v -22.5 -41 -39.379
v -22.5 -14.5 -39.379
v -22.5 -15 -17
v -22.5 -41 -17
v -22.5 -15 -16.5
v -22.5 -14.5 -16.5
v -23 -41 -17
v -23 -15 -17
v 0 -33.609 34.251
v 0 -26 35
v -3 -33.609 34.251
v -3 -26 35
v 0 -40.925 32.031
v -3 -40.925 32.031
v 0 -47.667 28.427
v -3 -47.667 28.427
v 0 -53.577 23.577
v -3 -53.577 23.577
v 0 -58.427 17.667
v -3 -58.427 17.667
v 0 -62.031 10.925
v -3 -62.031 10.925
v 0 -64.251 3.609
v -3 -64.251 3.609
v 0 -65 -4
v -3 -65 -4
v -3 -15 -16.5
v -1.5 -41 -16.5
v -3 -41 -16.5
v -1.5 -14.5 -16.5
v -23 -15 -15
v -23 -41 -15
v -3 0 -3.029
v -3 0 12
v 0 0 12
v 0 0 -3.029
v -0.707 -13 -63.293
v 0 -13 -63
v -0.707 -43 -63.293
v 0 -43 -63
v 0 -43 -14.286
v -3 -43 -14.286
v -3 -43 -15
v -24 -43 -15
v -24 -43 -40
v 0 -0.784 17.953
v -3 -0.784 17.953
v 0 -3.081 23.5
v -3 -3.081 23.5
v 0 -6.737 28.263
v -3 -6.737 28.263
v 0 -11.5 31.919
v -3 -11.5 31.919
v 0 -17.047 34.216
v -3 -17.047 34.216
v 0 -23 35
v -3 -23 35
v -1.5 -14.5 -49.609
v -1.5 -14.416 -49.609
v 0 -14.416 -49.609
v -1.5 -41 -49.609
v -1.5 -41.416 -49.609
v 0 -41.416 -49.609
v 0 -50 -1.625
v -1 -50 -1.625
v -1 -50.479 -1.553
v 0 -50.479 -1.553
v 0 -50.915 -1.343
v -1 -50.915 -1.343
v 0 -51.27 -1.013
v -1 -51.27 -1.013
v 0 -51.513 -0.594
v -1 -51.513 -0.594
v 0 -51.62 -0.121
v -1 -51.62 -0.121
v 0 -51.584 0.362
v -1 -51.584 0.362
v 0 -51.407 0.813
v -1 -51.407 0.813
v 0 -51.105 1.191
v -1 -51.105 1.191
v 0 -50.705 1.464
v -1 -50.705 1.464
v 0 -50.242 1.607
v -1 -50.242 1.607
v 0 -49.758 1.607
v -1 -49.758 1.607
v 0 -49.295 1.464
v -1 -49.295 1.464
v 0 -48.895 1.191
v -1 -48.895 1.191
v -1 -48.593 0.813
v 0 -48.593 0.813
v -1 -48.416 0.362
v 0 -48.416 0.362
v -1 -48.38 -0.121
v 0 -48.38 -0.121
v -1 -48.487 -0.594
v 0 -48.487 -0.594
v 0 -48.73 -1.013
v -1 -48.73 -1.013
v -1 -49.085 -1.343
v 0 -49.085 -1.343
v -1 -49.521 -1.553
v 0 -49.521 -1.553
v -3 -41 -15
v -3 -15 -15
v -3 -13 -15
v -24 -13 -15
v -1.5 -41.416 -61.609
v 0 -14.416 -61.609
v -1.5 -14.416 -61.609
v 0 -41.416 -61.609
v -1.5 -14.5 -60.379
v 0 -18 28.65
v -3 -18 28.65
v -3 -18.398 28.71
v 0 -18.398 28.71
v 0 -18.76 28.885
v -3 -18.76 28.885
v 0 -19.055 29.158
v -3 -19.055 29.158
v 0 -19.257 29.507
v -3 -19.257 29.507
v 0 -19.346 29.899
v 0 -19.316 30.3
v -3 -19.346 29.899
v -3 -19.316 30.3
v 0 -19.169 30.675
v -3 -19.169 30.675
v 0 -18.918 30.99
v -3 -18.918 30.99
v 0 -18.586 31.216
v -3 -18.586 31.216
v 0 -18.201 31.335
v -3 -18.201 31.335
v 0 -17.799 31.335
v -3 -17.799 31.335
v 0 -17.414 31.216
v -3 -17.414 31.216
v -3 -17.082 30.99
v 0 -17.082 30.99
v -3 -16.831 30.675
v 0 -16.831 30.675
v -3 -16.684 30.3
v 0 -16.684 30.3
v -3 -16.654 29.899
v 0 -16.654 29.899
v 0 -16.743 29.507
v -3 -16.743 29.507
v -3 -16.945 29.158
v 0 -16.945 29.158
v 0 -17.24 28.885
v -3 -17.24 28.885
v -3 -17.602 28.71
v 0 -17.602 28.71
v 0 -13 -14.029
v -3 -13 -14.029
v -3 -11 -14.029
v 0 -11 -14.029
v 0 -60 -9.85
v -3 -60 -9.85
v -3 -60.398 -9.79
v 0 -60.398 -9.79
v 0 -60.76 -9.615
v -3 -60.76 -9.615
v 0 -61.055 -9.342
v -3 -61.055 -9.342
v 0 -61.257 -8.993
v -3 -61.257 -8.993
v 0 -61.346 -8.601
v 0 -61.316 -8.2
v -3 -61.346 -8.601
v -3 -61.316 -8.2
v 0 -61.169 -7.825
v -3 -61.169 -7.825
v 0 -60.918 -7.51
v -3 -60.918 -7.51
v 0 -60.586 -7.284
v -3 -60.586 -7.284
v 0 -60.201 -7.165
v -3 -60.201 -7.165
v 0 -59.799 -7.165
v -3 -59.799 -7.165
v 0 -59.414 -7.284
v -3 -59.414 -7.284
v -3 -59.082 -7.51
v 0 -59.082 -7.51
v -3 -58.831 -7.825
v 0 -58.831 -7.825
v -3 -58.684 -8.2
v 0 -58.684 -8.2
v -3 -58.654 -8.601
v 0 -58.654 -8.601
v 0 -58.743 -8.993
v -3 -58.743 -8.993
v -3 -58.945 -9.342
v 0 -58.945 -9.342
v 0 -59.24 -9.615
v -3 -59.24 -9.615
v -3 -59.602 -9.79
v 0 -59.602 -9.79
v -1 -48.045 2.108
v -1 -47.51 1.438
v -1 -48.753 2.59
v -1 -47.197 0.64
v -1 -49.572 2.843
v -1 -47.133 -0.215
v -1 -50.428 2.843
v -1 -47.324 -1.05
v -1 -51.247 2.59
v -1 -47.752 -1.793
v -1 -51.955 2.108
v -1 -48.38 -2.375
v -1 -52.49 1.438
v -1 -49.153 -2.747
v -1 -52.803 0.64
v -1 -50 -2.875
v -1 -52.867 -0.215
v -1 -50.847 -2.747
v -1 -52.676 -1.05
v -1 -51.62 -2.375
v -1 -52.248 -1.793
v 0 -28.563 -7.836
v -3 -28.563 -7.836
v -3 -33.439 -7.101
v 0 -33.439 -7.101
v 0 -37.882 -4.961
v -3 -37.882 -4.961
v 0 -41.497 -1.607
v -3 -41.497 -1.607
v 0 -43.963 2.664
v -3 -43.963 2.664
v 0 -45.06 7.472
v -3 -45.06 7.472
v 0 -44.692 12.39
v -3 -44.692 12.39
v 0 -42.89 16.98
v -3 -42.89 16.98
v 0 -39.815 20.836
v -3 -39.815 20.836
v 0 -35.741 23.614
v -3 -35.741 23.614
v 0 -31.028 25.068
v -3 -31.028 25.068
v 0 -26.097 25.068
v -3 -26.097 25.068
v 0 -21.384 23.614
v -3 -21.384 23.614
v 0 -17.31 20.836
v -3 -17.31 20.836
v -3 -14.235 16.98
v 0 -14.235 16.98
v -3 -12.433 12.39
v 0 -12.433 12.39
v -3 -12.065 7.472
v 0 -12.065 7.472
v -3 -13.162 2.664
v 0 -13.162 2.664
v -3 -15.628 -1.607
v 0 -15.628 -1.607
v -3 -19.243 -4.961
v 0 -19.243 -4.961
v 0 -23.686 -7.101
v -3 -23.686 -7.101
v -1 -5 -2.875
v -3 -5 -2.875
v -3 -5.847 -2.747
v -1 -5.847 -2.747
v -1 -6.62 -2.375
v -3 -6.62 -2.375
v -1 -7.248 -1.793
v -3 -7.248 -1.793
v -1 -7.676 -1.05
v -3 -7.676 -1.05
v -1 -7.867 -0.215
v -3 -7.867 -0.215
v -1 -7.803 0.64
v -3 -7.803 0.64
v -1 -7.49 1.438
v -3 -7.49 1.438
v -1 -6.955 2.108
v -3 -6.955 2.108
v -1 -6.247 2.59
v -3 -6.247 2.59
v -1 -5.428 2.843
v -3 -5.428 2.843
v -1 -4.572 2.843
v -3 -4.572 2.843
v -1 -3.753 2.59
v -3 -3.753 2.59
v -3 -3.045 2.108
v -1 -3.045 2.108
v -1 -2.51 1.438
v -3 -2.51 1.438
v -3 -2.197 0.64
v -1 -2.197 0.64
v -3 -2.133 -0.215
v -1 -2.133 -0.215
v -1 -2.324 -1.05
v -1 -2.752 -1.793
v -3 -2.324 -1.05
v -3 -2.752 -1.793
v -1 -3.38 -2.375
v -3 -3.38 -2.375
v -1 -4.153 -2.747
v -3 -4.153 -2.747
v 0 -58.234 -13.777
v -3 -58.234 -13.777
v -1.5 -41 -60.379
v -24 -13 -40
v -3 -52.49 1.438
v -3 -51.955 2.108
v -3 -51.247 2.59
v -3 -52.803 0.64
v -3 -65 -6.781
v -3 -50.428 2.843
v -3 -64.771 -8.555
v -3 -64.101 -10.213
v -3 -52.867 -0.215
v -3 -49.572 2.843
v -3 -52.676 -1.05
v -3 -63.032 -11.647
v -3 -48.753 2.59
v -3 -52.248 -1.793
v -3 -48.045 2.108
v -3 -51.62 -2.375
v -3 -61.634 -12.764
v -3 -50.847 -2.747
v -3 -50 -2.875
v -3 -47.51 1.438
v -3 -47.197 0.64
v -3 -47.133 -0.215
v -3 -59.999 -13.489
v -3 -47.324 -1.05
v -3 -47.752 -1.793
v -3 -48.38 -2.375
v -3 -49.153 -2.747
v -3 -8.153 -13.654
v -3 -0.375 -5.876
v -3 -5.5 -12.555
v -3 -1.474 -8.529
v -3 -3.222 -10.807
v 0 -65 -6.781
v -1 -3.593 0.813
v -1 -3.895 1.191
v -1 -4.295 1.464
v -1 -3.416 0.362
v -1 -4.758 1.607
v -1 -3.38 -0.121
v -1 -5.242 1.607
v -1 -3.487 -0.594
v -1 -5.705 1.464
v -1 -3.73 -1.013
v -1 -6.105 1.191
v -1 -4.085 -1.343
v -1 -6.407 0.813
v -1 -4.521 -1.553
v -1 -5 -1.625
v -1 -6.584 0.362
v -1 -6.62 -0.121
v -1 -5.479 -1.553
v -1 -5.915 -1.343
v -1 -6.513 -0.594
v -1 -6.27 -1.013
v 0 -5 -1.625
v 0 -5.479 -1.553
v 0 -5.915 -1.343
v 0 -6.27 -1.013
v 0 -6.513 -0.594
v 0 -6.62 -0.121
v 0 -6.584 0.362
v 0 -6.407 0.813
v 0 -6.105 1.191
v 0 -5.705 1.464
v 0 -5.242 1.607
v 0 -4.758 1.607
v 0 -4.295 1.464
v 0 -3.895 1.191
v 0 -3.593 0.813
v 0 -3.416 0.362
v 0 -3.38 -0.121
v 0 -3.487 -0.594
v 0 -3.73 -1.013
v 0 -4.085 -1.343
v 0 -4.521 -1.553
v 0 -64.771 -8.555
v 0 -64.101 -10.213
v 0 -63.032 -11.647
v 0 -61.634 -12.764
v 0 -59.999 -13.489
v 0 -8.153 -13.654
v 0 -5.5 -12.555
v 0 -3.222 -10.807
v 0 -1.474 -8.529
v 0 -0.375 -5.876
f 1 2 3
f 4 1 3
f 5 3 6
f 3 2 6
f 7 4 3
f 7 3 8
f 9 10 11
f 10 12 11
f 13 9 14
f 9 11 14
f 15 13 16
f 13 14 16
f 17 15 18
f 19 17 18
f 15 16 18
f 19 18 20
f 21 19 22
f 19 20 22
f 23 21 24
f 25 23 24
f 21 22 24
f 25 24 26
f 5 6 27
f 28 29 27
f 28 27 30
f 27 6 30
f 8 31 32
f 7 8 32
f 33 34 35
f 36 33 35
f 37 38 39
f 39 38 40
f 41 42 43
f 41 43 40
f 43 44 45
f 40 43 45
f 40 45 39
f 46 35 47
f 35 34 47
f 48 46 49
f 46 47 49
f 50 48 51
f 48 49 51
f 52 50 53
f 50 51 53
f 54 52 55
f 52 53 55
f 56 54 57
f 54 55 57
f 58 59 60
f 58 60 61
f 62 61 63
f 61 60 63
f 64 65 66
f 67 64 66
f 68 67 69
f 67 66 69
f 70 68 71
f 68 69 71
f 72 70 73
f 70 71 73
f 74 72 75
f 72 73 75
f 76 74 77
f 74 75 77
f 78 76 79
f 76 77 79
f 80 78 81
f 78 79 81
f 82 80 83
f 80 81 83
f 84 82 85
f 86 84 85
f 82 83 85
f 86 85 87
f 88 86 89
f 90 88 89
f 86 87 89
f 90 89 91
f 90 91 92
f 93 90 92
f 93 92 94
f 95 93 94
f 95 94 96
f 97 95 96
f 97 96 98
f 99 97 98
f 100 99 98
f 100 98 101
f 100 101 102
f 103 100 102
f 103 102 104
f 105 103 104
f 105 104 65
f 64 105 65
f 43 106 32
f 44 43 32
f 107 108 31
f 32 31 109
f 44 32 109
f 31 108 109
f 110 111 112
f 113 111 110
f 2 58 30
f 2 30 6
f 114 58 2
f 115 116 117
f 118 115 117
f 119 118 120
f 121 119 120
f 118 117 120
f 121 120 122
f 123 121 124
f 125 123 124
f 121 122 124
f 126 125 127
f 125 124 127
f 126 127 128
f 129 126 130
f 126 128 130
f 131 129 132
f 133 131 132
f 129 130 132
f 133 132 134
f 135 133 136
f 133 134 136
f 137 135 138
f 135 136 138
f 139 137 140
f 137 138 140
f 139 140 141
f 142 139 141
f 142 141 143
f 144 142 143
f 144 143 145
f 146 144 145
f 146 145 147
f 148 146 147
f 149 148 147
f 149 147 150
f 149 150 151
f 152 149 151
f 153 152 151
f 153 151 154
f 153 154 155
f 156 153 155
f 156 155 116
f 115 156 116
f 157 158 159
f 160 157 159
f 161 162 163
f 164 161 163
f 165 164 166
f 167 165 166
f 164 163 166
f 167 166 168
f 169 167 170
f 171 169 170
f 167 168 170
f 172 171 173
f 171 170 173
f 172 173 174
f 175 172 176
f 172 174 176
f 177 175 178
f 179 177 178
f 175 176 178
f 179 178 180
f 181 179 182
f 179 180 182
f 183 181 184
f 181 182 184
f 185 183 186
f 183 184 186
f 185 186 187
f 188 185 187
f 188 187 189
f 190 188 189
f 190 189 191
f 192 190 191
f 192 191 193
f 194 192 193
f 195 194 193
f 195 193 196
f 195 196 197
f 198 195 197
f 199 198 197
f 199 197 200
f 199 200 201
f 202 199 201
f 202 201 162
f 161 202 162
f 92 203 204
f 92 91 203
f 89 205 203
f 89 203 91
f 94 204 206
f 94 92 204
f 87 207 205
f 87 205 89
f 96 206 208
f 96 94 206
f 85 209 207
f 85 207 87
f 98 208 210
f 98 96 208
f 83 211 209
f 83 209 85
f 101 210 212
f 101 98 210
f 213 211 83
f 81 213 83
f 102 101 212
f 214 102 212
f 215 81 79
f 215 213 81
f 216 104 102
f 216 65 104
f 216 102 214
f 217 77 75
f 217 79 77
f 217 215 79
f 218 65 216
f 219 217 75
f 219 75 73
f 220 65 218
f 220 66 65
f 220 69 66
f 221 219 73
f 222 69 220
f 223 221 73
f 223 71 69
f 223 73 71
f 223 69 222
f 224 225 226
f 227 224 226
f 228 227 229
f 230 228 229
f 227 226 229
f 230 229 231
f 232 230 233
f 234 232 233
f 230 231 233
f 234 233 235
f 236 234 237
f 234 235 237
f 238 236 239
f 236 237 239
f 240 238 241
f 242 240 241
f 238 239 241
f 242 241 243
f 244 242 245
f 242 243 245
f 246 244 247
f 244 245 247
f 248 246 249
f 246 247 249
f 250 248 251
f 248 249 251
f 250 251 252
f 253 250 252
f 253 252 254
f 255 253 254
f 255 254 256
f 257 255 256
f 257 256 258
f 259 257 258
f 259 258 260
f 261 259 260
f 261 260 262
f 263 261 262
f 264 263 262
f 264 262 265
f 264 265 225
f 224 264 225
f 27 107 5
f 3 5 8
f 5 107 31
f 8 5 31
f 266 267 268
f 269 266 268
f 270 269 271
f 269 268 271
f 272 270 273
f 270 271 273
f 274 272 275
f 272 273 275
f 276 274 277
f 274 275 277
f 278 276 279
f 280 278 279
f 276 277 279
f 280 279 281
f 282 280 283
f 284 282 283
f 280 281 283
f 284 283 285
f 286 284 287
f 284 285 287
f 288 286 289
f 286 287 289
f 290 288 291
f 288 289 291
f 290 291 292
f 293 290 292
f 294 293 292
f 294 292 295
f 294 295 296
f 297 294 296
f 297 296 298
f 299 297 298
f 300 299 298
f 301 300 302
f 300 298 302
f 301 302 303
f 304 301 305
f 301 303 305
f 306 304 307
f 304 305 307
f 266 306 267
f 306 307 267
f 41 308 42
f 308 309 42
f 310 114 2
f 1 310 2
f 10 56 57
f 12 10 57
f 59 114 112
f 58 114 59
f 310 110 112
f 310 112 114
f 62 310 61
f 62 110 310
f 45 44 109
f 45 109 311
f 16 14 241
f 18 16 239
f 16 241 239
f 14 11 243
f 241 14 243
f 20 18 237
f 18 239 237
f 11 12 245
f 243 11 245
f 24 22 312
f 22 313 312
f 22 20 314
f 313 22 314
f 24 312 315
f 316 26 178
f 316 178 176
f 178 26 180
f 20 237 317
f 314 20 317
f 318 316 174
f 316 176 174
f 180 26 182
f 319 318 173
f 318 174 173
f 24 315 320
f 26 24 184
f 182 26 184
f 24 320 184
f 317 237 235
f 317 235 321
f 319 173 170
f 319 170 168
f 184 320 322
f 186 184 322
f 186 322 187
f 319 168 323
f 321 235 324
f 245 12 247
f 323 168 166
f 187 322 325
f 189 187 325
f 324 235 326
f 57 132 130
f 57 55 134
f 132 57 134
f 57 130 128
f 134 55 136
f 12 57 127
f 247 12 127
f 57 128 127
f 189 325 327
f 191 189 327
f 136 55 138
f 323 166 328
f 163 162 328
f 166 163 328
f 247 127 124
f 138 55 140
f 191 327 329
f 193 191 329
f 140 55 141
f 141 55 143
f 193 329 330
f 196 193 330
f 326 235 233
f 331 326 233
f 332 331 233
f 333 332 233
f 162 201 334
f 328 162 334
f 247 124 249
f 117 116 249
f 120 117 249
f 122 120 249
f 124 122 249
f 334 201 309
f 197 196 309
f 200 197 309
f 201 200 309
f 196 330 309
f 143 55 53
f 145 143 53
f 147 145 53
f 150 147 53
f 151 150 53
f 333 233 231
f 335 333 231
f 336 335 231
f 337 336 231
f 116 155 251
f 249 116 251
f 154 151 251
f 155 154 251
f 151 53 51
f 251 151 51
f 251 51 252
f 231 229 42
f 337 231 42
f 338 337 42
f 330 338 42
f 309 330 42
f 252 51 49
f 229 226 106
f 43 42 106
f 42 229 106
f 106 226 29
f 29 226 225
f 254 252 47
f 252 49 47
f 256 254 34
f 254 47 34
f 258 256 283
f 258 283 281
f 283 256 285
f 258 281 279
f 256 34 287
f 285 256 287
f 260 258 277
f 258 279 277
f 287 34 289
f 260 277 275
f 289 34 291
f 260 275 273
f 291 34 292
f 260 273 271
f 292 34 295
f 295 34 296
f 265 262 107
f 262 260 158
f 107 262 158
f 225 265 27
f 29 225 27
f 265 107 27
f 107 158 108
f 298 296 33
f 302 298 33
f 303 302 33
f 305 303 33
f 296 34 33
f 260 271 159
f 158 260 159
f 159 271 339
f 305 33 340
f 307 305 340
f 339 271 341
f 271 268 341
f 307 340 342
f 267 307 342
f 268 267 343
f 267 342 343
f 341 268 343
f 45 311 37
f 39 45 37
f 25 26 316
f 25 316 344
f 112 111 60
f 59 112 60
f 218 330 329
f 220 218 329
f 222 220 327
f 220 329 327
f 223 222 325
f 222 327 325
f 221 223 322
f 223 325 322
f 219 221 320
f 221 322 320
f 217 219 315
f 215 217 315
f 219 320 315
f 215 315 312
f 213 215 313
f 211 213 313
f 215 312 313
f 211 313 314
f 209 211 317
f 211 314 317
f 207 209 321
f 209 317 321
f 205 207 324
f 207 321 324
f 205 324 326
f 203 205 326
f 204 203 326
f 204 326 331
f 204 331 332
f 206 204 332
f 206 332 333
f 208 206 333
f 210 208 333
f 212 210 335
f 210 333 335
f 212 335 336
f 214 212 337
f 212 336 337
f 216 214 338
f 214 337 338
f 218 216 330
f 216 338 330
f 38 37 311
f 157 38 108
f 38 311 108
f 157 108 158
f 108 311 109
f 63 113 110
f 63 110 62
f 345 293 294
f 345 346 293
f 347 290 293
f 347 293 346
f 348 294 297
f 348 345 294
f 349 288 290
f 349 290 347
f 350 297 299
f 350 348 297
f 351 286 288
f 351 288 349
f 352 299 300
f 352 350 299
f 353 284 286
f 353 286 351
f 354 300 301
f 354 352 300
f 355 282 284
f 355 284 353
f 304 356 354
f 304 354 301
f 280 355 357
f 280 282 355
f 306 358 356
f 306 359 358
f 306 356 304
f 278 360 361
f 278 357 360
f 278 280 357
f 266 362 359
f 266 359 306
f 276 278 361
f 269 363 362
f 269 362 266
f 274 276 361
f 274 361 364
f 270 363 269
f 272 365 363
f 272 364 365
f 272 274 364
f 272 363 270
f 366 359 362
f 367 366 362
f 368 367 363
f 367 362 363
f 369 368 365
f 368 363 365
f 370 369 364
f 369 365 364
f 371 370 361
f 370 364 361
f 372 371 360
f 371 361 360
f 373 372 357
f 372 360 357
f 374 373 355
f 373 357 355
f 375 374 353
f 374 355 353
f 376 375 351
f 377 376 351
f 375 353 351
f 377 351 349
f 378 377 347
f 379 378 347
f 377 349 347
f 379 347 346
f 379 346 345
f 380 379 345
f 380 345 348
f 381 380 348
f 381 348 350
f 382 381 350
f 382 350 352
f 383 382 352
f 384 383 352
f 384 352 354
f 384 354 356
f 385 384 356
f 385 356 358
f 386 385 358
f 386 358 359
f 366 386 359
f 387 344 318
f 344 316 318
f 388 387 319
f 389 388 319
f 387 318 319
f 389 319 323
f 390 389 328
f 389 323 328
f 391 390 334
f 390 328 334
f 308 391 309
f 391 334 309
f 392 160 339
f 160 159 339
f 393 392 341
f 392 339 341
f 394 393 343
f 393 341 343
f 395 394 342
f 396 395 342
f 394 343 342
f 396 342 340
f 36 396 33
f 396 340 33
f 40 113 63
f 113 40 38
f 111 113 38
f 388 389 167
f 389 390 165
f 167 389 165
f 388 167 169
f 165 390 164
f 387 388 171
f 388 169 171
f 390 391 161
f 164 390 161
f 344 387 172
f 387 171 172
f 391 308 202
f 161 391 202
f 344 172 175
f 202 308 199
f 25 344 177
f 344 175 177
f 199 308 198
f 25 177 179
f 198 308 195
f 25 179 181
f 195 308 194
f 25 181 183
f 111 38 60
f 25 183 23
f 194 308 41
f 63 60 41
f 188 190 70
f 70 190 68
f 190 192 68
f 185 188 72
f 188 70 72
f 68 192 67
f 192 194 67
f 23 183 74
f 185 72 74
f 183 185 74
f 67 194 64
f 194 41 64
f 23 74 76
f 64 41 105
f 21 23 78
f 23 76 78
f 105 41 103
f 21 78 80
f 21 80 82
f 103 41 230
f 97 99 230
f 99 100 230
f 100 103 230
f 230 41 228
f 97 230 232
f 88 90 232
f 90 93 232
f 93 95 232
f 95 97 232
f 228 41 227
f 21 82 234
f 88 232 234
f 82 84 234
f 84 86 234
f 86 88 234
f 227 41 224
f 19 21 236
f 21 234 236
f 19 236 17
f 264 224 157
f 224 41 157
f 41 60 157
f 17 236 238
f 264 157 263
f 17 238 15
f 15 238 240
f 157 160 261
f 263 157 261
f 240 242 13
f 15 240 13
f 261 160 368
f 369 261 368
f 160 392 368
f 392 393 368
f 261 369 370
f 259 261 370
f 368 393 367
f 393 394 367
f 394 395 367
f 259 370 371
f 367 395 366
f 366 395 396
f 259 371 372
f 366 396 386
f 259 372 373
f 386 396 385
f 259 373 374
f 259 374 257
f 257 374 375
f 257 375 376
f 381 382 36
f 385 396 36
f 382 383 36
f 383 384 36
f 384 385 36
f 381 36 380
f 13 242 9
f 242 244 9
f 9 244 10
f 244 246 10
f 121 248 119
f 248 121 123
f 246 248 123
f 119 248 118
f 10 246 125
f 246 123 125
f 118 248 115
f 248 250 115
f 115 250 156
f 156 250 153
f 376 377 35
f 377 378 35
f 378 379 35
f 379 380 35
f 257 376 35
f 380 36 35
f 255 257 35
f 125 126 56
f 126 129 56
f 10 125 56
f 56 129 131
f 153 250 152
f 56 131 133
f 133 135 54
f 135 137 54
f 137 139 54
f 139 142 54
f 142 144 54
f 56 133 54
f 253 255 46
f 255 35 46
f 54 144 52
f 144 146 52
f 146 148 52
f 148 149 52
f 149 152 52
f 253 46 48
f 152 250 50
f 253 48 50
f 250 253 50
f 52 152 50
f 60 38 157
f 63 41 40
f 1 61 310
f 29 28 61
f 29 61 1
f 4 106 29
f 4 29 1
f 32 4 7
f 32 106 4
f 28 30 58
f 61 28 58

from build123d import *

# Parameters (mm, degrees)
PAD_DEPTH       = 65
SKETCH052_R     = 1.625
POCKET_DEPTH    = 5
SKETCH053_R     = 2.875
POCKET001_DEPTH = 2
SKETCH054_R     = 1.35
POCKET002_DEPTH = 5
SKETCH055_W     = 20
SKETCH055_H     = 26
POCKET003_DEPTH = 2
POCKET004_DEPTH = 28
POCKET005_DEPTH = 28
PAD001_DEPTH    = 1.5
SKETCH062_W     = 12
SKETCH062_H     = 27
POCKET006_DEPTH = 1.5
CHAMFER_SIZE    = 1
FILLET_R        = 11
FILLET001_R     = 23
FILLET002_R     = 39
FILLET003_R     = 7
SKETCH063_R     = 16.544176
POCKET007_DEPTH = 5


with BuildPart() as part:
    # Sketch → Pad (new body)
    with BuildSketch(Plane.XZ):
        Polygon((0, -64), (0, 35), (-3, 35), (-3, -15), (-24, -15), (-24, -40), align=None)
    extrude(amount=PAD_DEPTH)

    # Sketch052 (on Face3 of Pad) → Pocket (cut)
    with BuildSketch(Plane(origin=(-3, 0, 0), x_dir=(0, 0, -1), z_dir=(-1, 0, 0))):
        with Locations((0, 5)):
            Circle(SKETCH052_R)
        with Locations((0, 50)):
            Circle(SKETCH052_R)
    extrude(amount=-POCKET_DEPTH, mode=Mode.SUBTRACT)

    # Sketch053 (on Face9 of Pocket) → Pocket001 (cut)
    with BuildSketch(Plane(origin=(-3, 0, 0), x_dir=(0, 0, -1), z_dir=(-1, 0, 0))):
        with Locations((0, 50)):
            Circle(SKETCH053_R)
        with Locations((0, 5)):
            Circle(SKETCH053_R)
    extrude(amount=-POCKET001_DEPTH, mode=Mode.SUBTRACT)

    # Sketch054 (on Face9 of Pocket001) → Pocket002 (cut)
    with BuildSketch(Plane(origin=(-3, 0, 0), x_dir=(0, 0, -1), z_dir=(-1, 0, 0))):
        with Locations((8.5, 60)):
            Circle(SKETCH054_R)
        with Locations((-30, 18)):
            Circle(SKETCH054_R)
    extrude(amount=-POCKET002_DEPTH, mode=Mode.SUBTRACT)

    # Sketch055 (on Face12 of Pocket002) → Pocket003 (cut)
    with BuildSketch(Plane(origin=(0, 0, -15), x_dir=(-1, 0, 0), z_dir=(0, 0, 1))):
        with Locations((13, 28)):
            Rectangle(SKETCH055_W, SKETCH055_H)
    extrude(amount=-POCKET003_DEPTH, mode=Mode.SUBTRACT)

    # Sketch056 (on Face10 of Pocket003) → Pocket004 (cut)
    with BuildSketch(Plane(origin=(-24, 0, 0), x_dir=(0, 0, -1), z_dir=(-1, 0, 0))):
        Polygon((14.286358, 43), (65, 43), (65, 13), (14.028623, 13), (14.028623, -3.205193), (140.957237, -3.205193), (140.957237, 77.307121), (13.139557, 77.307121), align=None)
    extrude(amount=-POCKET004_DEPTH, mode=Mode.SUBTRACT)

    # Sketch057 (on Face2 of Pocket004) → Pocket005 (cut)
    with BuildSketch(Plane(origin=(0, -13, 0), x_dir=(1, 0, 0), z_dir=(0, 1, 0))):
        Polygon((-22.5, 16.5), (-1.5, 16.5), (-1.5, 60.37868), (-22.5, 39.37868), align=None)
    extrude(amount=-POCKET005_DEPTH, mode=Mode.SUBTRACT)

    # Sketch061 (on Face2 of Pocket005) → Pad001 (join)
    with BuildSketch(Plane(origin=(0, -13, 0), x_dir=(1, 0, 0), z_dir=(0, 1, 0))):
        Polygon((-1.009204, 15.459926), (-23.050085, 15.459926), (-23.050085, 39.634087), (-1.009204, 61.831638), align=None)
    extrude(amount=-PAD001_DEPTH)

    # Sketch062 (on Face1 of Pad001) → Pocket006 (cut)
    with BuildSketch(Plane(origin=(0, 0, 0), x_dir=(0, 0, 1), z_dir=(1, 0, 0))):
        with Locations((-55.608883, 27.916479)):
            Rectangle(SKETCH062_W, SKETCH062_H)
    extrude(amount=-POCKET006_DEPTH, mode=Mode.SUBTRACT)

    # Chamfer
    chamfer_edges = [part.edges().sort_by_distance(p)[0] for p in [
        (0, -28, -64),
    ]]
    chamfer(chamfer_edges, length=CHAMFER_SIZE)

    # Fillet
    fillet_edges = [part.edges().sort_by_distance(p)[0] for p in [
        (-1.5, 0, -14.028623),
    ]]
    fillet(fillet_edges, radius=FILLET_R)

    # Fillet001
    fillet001_edges = [part.edges().sort_by_distance(p)[0] for p in [
        (-1.5, 0, 35),
    ]]
    fillet(fillet001_edges, radius=FILLET001_R)

    # Fillet002
    fillet002_edges = [part.edges().sort_by_distance(p)[0] for p in [
        (-1.5, -65, 35),
    ]]
    fillet(fillet002_edges, radius=FILLET002_R)

    # Fillet003
    fillet003_edges = [part.edges().sort_by_distance(p)[0] for p in [
        (-1.5, -65, -13.550953),
    ]]
    fillet(fillet003_edges, radius=FILLET003_R)

    # Sketch063 (on Face22 of Fillet003) → Pocket007 (cut)
    with BuildSketch(Plane(origin=(-3, 0, 0), x_dir=(0, 0, -1), z_dir=(-1, 0, 0))):
        with Locations((-8.708356, 28.562584)):
            Circle(SKETCH063_R)
    extrude(amount=-POCKET007_DEPTH, mode=Mode.SUBTRACT)


solid = part.part
